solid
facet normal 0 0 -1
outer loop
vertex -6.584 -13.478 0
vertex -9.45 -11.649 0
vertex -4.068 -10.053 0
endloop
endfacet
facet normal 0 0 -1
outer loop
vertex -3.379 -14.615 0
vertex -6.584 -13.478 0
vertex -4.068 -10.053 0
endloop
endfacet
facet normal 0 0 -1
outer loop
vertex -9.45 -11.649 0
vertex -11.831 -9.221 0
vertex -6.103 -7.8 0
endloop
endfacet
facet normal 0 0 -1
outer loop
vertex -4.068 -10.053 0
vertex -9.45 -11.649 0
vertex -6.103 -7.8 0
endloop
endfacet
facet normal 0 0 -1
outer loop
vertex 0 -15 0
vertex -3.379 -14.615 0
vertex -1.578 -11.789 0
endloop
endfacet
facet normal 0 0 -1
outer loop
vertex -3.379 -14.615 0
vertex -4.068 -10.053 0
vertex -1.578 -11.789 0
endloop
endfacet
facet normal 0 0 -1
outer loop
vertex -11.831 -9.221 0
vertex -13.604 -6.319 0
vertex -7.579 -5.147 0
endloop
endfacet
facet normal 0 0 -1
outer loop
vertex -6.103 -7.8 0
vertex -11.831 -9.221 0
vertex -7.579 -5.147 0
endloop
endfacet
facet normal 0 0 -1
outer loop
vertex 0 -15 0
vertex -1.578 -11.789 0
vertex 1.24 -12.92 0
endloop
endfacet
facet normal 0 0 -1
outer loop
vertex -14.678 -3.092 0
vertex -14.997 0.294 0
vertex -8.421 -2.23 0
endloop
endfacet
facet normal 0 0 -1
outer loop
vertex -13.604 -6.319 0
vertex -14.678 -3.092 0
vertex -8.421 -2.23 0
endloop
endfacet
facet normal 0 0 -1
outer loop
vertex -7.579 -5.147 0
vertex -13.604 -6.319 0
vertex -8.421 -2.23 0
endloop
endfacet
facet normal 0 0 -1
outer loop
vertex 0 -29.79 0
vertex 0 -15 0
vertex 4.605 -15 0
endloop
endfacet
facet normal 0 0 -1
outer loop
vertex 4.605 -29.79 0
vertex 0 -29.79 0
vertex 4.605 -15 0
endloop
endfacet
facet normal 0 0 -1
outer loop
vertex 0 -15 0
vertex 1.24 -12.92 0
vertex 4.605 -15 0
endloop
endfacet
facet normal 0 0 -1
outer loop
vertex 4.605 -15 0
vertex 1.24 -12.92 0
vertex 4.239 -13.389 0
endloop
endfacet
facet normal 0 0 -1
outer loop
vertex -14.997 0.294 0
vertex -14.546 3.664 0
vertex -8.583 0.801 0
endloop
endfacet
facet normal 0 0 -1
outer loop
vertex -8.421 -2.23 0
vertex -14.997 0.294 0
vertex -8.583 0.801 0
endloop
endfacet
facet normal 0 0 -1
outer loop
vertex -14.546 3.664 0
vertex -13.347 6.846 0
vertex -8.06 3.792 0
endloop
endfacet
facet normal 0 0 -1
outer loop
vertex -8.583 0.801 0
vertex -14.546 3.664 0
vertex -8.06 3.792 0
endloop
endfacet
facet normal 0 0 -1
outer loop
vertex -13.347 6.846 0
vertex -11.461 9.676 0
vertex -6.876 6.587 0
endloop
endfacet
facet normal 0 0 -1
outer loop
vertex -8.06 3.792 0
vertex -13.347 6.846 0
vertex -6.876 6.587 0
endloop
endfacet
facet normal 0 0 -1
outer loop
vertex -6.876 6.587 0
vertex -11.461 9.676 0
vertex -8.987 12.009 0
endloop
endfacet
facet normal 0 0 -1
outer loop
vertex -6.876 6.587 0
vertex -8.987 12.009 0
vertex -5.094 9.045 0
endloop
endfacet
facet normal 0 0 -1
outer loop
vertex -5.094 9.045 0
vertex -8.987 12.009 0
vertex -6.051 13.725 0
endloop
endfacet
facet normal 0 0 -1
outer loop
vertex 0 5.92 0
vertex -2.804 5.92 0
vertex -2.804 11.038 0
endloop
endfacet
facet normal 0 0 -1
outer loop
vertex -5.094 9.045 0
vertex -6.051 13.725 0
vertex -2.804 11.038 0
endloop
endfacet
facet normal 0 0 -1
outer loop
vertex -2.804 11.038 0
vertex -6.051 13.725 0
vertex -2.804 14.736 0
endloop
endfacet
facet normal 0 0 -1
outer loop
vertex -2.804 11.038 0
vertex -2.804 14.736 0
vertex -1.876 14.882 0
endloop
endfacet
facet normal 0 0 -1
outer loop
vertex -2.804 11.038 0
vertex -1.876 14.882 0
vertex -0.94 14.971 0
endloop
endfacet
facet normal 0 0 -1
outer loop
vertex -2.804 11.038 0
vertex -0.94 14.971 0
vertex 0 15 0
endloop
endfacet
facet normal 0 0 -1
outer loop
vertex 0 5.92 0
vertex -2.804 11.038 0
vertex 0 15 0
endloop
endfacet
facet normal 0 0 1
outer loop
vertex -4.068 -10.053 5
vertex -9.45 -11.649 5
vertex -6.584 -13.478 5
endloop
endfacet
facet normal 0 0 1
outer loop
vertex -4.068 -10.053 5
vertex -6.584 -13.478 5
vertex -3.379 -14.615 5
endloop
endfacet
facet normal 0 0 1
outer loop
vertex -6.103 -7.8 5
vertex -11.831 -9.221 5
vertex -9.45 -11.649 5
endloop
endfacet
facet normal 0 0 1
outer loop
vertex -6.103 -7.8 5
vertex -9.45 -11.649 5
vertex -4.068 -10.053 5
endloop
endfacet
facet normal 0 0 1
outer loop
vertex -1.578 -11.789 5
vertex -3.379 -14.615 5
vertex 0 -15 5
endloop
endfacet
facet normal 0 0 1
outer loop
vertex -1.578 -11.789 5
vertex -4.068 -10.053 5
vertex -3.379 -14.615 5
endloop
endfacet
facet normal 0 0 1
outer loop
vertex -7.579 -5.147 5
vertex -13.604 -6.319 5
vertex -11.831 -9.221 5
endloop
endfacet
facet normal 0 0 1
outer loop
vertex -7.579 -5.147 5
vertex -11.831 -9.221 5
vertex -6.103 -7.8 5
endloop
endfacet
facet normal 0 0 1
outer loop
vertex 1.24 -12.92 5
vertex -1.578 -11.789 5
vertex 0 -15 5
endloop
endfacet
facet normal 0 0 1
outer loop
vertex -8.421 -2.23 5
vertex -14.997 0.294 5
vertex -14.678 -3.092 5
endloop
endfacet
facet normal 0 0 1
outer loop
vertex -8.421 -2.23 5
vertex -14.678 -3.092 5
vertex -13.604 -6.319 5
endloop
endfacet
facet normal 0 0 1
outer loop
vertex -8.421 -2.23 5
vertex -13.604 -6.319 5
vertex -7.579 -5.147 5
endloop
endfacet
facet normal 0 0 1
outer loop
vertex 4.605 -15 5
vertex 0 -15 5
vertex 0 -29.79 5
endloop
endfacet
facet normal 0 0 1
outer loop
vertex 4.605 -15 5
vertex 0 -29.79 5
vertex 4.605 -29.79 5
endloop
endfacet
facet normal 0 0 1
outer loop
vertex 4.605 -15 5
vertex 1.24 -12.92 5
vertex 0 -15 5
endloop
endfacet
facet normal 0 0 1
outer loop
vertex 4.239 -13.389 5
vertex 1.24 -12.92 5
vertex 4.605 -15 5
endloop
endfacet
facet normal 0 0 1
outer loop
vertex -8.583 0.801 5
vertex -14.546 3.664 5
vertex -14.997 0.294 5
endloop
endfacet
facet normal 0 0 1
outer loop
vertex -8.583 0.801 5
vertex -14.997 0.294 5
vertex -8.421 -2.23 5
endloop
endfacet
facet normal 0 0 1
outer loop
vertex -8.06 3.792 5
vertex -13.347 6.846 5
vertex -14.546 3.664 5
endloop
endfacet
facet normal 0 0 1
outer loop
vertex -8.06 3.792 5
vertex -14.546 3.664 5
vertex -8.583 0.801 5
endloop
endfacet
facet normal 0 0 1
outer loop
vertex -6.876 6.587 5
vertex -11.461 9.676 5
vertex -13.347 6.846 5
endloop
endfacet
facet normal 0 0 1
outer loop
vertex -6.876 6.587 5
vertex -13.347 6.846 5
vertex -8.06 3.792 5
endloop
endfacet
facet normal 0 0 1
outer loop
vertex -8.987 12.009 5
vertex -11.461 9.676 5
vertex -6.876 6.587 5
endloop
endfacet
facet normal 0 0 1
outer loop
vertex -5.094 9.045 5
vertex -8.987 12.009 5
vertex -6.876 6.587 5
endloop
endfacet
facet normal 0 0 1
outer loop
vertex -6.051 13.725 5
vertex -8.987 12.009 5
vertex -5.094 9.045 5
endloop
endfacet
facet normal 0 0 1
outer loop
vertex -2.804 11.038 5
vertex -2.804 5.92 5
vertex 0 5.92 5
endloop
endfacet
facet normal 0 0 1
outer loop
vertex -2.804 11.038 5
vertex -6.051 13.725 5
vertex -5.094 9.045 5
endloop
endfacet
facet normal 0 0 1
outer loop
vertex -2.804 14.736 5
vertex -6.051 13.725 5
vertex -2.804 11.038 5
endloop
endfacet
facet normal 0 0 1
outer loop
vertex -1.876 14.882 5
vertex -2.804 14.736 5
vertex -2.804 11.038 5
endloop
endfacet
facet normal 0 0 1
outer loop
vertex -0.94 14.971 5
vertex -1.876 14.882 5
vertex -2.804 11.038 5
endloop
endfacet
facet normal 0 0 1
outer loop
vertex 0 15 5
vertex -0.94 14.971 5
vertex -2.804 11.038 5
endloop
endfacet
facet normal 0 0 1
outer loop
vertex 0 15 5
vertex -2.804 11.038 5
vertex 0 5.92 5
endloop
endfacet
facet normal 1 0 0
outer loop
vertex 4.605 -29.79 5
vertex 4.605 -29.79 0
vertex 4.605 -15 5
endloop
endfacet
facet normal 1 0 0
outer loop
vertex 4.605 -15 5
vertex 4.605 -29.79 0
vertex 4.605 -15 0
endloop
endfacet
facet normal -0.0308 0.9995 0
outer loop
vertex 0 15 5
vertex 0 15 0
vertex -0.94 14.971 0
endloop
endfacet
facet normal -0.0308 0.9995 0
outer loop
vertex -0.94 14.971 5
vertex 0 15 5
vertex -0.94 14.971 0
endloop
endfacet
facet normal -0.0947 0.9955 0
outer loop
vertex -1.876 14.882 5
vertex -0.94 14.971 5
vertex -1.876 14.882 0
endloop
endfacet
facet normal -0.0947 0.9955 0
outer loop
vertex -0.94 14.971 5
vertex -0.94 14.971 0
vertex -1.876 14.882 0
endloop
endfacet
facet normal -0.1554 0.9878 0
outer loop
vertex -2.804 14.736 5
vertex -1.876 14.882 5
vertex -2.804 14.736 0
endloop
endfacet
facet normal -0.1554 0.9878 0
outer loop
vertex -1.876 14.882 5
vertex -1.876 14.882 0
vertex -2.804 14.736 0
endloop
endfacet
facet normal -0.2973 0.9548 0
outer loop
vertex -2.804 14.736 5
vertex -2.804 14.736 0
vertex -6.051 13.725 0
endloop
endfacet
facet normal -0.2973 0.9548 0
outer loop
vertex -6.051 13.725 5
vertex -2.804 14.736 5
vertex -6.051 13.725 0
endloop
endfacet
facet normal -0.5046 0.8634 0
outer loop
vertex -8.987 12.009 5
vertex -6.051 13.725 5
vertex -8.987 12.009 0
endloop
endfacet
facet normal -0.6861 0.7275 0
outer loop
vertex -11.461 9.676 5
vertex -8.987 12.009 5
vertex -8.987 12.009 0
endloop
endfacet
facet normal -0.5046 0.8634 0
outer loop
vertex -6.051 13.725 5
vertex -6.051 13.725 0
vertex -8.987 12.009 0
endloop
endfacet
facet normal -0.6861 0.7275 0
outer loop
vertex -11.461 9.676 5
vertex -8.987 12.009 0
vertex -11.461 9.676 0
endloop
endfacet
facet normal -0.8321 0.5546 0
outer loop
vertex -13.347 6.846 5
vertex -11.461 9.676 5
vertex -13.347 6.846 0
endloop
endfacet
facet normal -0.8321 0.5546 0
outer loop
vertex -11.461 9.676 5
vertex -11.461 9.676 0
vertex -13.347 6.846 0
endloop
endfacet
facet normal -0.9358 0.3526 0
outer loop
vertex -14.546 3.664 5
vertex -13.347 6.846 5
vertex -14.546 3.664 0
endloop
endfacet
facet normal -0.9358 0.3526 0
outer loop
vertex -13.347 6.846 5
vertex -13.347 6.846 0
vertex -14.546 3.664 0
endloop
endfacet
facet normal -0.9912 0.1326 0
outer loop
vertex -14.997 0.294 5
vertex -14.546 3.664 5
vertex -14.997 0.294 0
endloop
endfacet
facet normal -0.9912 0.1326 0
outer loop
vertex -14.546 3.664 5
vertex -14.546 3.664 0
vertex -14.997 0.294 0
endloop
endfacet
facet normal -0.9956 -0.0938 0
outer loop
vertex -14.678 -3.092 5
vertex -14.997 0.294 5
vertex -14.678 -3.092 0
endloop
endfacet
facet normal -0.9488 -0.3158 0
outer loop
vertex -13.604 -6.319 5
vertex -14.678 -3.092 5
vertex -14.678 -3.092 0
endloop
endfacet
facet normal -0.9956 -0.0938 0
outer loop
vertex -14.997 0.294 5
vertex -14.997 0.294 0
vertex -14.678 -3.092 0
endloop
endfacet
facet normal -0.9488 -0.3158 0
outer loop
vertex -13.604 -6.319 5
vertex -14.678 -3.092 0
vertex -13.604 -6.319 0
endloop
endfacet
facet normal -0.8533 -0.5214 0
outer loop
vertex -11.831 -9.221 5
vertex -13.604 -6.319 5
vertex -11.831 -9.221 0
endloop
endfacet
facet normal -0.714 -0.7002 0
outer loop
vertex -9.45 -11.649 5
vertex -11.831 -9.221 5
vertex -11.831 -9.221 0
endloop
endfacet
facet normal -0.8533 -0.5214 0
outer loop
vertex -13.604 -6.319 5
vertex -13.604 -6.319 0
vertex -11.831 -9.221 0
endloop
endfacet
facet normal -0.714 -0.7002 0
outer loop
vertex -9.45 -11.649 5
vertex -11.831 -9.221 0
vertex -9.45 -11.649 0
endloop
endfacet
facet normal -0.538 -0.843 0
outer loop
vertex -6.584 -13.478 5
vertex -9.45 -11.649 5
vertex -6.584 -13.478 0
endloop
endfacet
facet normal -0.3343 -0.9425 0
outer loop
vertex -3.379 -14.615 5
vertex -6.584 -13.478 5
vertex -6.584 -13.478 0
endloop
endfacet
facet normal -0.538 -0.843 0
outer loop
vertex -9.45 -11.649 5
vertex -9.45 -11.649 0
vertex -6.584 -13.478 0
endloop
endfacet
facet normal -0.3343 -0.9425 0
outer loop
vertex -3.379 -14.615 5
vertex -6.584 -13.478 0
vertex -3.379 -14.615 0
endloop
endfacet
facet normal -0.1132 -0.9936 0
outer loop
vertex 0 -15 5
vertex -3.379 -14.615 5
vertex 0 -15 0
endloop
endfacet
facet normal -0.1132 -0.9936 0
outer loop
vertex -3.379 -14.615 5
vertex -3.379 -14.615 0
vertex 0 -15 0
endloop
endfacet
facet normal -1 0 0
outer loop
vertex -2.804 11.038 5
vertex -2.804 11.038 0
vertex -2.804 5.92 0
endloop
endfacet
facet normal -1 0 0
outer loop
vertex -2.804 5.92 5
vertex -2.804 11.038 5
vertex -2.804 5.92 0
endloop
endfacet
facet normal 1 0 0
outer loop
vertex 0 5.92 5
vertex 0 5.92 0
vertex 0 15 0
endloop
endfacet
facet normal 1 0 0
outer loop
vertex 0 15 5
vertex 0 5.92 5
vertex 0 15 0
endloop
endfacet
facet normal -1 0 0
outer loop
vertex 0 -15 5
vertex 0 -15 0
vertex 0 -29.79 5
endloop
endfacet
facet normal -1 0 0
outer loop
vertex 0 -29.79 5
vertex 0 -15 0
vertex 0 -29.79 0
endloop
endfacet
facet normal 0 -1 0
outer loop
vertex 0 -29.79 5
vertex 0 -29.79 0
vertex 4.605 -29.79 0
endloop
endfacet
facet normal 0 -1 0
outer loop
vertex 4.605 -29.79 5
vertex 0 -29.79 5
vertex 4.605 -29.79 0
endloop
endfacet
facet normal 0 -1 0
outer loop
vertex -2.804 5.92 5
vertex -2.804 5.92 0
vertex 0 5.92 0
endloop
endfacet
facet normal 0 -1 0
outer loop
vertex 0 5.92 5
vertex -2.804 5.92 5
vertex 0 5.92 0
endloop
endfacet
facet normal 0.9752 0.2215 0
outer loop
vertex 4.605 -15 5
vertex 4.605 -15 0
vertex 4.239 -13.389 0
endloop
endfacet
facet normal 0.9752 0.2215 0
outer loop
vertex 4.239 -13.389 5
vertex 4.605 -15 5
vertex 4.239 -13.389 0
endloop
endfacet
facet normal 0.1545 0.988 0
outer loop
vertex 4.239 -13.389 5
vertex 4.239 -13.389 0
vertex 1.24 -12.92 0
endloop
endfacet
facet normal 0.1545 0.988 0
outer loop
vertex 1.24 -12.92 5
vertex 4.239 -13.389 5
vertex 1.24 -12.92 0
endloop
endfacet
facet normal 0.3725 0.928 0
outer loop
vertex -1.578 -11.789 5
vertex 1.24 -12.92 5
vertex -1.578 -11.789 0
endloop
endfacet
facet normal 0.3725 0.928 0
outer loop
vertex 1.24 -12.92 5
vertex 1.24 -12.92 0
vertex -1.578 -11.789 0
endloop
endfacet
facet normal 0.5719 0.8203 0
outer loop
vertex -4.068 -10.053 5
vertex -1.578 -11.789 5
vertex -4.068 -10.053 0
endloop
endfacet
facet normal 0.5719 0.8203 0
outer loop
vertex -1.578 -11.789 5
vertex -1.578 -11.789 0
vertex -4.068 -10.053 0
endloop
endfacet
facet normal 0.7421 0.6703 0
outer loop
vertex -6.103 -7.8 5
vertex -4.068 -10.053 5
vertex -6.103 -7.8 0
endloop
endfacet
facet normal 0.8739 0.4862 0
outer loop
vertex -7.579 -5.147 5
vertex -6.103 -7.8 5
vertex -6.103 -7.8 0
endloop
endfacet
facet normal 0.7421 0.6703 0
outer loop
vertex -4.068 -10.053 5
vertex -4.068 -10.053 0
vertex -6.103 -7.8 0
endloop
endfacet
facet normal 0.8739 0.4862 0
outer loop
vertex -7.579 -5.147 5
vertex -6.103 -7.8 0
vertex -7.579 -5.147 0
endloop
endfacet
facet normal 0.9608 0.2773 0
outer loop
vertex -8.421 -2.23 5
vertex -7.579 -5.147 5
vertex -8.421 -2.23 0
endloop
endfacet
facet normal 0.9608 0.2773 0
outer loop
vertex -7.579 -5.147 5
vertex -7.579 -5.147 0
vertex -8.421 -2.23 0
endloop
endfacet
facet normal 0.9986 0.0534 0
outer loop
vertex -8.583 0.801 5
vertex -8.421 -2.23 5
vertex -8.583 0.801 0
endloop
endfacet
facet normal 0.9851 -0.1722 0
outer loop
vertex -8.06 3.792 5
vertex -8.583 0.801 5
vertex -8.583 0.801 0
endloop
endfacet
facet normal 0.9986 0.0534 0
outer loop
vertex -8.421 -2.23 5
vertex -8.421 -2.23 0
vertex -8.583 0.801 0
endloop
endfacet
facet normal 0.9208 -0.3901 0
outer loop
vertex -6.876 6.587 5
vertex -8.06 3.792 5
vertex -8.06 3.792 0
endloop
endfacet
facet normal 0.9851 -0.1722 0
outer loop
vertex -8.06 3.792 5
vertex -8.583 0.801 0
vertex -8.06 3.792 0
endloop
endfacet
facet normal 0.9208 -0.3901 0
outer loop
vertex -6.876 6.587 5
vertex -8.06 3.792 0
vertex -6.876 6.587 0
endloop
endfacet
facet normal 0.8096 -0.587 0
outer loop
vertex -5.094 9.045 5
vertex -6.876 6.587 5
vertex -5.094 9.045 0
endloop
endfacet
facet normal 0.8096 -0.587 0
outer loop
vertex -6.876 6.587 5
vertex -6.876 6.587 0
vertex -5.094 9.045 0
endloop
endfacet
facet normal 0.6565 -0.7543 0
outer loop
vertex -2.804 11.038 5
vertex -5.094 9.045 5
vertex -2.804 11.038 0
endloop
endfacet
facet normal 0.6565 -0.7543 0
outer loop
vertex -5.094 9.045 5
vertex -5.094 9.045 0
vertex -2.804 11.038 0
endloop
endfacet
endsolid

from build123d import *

# Parameters (mm, degrees)
F1_DEPTH = 5


with BuildPart() as f1:
    # F0 (on Top) → F1 (new body)
    with BuildSketch(Plane.XY):
        with BuildLine():
            Line((-2.80428, 11.038499), (-2.80428, 14.735536))
            ThreePointArc((-2.80428, 14.735536), (-14.933738, -1.408361), (0, -15))
            Line((0, -15), (0, -29.789679))
            Line((0, -29.789679), (4.604714, -29.789679))
            Line((4.604714, -29.789679), (4.604714, -15))
            Line((4.604714, -15), (4.239221, -13.388641))
            ThreePointArc((4.239221, -13.388641), (-8.082837, -3.712616), (-2.80428, 11.038499))
        make_face()
        with BuildLine():
            Line((0, 5.920346), (0, 15))
            ThreePointArc((0, 15), (-1.408361, 14.933738), (-2.80428, 14.735536))
            Line((-2.80428, 14.735536), (-2.80428, 11.038499))
            Line((-2.80428, 11.038499), (-2.80428, 5.920346))
            Line((-2.80428, 5.920346), (0, 5.920346))
        make_face()
    extrude(amount=F1_DEPTH)


solid = f1.part
